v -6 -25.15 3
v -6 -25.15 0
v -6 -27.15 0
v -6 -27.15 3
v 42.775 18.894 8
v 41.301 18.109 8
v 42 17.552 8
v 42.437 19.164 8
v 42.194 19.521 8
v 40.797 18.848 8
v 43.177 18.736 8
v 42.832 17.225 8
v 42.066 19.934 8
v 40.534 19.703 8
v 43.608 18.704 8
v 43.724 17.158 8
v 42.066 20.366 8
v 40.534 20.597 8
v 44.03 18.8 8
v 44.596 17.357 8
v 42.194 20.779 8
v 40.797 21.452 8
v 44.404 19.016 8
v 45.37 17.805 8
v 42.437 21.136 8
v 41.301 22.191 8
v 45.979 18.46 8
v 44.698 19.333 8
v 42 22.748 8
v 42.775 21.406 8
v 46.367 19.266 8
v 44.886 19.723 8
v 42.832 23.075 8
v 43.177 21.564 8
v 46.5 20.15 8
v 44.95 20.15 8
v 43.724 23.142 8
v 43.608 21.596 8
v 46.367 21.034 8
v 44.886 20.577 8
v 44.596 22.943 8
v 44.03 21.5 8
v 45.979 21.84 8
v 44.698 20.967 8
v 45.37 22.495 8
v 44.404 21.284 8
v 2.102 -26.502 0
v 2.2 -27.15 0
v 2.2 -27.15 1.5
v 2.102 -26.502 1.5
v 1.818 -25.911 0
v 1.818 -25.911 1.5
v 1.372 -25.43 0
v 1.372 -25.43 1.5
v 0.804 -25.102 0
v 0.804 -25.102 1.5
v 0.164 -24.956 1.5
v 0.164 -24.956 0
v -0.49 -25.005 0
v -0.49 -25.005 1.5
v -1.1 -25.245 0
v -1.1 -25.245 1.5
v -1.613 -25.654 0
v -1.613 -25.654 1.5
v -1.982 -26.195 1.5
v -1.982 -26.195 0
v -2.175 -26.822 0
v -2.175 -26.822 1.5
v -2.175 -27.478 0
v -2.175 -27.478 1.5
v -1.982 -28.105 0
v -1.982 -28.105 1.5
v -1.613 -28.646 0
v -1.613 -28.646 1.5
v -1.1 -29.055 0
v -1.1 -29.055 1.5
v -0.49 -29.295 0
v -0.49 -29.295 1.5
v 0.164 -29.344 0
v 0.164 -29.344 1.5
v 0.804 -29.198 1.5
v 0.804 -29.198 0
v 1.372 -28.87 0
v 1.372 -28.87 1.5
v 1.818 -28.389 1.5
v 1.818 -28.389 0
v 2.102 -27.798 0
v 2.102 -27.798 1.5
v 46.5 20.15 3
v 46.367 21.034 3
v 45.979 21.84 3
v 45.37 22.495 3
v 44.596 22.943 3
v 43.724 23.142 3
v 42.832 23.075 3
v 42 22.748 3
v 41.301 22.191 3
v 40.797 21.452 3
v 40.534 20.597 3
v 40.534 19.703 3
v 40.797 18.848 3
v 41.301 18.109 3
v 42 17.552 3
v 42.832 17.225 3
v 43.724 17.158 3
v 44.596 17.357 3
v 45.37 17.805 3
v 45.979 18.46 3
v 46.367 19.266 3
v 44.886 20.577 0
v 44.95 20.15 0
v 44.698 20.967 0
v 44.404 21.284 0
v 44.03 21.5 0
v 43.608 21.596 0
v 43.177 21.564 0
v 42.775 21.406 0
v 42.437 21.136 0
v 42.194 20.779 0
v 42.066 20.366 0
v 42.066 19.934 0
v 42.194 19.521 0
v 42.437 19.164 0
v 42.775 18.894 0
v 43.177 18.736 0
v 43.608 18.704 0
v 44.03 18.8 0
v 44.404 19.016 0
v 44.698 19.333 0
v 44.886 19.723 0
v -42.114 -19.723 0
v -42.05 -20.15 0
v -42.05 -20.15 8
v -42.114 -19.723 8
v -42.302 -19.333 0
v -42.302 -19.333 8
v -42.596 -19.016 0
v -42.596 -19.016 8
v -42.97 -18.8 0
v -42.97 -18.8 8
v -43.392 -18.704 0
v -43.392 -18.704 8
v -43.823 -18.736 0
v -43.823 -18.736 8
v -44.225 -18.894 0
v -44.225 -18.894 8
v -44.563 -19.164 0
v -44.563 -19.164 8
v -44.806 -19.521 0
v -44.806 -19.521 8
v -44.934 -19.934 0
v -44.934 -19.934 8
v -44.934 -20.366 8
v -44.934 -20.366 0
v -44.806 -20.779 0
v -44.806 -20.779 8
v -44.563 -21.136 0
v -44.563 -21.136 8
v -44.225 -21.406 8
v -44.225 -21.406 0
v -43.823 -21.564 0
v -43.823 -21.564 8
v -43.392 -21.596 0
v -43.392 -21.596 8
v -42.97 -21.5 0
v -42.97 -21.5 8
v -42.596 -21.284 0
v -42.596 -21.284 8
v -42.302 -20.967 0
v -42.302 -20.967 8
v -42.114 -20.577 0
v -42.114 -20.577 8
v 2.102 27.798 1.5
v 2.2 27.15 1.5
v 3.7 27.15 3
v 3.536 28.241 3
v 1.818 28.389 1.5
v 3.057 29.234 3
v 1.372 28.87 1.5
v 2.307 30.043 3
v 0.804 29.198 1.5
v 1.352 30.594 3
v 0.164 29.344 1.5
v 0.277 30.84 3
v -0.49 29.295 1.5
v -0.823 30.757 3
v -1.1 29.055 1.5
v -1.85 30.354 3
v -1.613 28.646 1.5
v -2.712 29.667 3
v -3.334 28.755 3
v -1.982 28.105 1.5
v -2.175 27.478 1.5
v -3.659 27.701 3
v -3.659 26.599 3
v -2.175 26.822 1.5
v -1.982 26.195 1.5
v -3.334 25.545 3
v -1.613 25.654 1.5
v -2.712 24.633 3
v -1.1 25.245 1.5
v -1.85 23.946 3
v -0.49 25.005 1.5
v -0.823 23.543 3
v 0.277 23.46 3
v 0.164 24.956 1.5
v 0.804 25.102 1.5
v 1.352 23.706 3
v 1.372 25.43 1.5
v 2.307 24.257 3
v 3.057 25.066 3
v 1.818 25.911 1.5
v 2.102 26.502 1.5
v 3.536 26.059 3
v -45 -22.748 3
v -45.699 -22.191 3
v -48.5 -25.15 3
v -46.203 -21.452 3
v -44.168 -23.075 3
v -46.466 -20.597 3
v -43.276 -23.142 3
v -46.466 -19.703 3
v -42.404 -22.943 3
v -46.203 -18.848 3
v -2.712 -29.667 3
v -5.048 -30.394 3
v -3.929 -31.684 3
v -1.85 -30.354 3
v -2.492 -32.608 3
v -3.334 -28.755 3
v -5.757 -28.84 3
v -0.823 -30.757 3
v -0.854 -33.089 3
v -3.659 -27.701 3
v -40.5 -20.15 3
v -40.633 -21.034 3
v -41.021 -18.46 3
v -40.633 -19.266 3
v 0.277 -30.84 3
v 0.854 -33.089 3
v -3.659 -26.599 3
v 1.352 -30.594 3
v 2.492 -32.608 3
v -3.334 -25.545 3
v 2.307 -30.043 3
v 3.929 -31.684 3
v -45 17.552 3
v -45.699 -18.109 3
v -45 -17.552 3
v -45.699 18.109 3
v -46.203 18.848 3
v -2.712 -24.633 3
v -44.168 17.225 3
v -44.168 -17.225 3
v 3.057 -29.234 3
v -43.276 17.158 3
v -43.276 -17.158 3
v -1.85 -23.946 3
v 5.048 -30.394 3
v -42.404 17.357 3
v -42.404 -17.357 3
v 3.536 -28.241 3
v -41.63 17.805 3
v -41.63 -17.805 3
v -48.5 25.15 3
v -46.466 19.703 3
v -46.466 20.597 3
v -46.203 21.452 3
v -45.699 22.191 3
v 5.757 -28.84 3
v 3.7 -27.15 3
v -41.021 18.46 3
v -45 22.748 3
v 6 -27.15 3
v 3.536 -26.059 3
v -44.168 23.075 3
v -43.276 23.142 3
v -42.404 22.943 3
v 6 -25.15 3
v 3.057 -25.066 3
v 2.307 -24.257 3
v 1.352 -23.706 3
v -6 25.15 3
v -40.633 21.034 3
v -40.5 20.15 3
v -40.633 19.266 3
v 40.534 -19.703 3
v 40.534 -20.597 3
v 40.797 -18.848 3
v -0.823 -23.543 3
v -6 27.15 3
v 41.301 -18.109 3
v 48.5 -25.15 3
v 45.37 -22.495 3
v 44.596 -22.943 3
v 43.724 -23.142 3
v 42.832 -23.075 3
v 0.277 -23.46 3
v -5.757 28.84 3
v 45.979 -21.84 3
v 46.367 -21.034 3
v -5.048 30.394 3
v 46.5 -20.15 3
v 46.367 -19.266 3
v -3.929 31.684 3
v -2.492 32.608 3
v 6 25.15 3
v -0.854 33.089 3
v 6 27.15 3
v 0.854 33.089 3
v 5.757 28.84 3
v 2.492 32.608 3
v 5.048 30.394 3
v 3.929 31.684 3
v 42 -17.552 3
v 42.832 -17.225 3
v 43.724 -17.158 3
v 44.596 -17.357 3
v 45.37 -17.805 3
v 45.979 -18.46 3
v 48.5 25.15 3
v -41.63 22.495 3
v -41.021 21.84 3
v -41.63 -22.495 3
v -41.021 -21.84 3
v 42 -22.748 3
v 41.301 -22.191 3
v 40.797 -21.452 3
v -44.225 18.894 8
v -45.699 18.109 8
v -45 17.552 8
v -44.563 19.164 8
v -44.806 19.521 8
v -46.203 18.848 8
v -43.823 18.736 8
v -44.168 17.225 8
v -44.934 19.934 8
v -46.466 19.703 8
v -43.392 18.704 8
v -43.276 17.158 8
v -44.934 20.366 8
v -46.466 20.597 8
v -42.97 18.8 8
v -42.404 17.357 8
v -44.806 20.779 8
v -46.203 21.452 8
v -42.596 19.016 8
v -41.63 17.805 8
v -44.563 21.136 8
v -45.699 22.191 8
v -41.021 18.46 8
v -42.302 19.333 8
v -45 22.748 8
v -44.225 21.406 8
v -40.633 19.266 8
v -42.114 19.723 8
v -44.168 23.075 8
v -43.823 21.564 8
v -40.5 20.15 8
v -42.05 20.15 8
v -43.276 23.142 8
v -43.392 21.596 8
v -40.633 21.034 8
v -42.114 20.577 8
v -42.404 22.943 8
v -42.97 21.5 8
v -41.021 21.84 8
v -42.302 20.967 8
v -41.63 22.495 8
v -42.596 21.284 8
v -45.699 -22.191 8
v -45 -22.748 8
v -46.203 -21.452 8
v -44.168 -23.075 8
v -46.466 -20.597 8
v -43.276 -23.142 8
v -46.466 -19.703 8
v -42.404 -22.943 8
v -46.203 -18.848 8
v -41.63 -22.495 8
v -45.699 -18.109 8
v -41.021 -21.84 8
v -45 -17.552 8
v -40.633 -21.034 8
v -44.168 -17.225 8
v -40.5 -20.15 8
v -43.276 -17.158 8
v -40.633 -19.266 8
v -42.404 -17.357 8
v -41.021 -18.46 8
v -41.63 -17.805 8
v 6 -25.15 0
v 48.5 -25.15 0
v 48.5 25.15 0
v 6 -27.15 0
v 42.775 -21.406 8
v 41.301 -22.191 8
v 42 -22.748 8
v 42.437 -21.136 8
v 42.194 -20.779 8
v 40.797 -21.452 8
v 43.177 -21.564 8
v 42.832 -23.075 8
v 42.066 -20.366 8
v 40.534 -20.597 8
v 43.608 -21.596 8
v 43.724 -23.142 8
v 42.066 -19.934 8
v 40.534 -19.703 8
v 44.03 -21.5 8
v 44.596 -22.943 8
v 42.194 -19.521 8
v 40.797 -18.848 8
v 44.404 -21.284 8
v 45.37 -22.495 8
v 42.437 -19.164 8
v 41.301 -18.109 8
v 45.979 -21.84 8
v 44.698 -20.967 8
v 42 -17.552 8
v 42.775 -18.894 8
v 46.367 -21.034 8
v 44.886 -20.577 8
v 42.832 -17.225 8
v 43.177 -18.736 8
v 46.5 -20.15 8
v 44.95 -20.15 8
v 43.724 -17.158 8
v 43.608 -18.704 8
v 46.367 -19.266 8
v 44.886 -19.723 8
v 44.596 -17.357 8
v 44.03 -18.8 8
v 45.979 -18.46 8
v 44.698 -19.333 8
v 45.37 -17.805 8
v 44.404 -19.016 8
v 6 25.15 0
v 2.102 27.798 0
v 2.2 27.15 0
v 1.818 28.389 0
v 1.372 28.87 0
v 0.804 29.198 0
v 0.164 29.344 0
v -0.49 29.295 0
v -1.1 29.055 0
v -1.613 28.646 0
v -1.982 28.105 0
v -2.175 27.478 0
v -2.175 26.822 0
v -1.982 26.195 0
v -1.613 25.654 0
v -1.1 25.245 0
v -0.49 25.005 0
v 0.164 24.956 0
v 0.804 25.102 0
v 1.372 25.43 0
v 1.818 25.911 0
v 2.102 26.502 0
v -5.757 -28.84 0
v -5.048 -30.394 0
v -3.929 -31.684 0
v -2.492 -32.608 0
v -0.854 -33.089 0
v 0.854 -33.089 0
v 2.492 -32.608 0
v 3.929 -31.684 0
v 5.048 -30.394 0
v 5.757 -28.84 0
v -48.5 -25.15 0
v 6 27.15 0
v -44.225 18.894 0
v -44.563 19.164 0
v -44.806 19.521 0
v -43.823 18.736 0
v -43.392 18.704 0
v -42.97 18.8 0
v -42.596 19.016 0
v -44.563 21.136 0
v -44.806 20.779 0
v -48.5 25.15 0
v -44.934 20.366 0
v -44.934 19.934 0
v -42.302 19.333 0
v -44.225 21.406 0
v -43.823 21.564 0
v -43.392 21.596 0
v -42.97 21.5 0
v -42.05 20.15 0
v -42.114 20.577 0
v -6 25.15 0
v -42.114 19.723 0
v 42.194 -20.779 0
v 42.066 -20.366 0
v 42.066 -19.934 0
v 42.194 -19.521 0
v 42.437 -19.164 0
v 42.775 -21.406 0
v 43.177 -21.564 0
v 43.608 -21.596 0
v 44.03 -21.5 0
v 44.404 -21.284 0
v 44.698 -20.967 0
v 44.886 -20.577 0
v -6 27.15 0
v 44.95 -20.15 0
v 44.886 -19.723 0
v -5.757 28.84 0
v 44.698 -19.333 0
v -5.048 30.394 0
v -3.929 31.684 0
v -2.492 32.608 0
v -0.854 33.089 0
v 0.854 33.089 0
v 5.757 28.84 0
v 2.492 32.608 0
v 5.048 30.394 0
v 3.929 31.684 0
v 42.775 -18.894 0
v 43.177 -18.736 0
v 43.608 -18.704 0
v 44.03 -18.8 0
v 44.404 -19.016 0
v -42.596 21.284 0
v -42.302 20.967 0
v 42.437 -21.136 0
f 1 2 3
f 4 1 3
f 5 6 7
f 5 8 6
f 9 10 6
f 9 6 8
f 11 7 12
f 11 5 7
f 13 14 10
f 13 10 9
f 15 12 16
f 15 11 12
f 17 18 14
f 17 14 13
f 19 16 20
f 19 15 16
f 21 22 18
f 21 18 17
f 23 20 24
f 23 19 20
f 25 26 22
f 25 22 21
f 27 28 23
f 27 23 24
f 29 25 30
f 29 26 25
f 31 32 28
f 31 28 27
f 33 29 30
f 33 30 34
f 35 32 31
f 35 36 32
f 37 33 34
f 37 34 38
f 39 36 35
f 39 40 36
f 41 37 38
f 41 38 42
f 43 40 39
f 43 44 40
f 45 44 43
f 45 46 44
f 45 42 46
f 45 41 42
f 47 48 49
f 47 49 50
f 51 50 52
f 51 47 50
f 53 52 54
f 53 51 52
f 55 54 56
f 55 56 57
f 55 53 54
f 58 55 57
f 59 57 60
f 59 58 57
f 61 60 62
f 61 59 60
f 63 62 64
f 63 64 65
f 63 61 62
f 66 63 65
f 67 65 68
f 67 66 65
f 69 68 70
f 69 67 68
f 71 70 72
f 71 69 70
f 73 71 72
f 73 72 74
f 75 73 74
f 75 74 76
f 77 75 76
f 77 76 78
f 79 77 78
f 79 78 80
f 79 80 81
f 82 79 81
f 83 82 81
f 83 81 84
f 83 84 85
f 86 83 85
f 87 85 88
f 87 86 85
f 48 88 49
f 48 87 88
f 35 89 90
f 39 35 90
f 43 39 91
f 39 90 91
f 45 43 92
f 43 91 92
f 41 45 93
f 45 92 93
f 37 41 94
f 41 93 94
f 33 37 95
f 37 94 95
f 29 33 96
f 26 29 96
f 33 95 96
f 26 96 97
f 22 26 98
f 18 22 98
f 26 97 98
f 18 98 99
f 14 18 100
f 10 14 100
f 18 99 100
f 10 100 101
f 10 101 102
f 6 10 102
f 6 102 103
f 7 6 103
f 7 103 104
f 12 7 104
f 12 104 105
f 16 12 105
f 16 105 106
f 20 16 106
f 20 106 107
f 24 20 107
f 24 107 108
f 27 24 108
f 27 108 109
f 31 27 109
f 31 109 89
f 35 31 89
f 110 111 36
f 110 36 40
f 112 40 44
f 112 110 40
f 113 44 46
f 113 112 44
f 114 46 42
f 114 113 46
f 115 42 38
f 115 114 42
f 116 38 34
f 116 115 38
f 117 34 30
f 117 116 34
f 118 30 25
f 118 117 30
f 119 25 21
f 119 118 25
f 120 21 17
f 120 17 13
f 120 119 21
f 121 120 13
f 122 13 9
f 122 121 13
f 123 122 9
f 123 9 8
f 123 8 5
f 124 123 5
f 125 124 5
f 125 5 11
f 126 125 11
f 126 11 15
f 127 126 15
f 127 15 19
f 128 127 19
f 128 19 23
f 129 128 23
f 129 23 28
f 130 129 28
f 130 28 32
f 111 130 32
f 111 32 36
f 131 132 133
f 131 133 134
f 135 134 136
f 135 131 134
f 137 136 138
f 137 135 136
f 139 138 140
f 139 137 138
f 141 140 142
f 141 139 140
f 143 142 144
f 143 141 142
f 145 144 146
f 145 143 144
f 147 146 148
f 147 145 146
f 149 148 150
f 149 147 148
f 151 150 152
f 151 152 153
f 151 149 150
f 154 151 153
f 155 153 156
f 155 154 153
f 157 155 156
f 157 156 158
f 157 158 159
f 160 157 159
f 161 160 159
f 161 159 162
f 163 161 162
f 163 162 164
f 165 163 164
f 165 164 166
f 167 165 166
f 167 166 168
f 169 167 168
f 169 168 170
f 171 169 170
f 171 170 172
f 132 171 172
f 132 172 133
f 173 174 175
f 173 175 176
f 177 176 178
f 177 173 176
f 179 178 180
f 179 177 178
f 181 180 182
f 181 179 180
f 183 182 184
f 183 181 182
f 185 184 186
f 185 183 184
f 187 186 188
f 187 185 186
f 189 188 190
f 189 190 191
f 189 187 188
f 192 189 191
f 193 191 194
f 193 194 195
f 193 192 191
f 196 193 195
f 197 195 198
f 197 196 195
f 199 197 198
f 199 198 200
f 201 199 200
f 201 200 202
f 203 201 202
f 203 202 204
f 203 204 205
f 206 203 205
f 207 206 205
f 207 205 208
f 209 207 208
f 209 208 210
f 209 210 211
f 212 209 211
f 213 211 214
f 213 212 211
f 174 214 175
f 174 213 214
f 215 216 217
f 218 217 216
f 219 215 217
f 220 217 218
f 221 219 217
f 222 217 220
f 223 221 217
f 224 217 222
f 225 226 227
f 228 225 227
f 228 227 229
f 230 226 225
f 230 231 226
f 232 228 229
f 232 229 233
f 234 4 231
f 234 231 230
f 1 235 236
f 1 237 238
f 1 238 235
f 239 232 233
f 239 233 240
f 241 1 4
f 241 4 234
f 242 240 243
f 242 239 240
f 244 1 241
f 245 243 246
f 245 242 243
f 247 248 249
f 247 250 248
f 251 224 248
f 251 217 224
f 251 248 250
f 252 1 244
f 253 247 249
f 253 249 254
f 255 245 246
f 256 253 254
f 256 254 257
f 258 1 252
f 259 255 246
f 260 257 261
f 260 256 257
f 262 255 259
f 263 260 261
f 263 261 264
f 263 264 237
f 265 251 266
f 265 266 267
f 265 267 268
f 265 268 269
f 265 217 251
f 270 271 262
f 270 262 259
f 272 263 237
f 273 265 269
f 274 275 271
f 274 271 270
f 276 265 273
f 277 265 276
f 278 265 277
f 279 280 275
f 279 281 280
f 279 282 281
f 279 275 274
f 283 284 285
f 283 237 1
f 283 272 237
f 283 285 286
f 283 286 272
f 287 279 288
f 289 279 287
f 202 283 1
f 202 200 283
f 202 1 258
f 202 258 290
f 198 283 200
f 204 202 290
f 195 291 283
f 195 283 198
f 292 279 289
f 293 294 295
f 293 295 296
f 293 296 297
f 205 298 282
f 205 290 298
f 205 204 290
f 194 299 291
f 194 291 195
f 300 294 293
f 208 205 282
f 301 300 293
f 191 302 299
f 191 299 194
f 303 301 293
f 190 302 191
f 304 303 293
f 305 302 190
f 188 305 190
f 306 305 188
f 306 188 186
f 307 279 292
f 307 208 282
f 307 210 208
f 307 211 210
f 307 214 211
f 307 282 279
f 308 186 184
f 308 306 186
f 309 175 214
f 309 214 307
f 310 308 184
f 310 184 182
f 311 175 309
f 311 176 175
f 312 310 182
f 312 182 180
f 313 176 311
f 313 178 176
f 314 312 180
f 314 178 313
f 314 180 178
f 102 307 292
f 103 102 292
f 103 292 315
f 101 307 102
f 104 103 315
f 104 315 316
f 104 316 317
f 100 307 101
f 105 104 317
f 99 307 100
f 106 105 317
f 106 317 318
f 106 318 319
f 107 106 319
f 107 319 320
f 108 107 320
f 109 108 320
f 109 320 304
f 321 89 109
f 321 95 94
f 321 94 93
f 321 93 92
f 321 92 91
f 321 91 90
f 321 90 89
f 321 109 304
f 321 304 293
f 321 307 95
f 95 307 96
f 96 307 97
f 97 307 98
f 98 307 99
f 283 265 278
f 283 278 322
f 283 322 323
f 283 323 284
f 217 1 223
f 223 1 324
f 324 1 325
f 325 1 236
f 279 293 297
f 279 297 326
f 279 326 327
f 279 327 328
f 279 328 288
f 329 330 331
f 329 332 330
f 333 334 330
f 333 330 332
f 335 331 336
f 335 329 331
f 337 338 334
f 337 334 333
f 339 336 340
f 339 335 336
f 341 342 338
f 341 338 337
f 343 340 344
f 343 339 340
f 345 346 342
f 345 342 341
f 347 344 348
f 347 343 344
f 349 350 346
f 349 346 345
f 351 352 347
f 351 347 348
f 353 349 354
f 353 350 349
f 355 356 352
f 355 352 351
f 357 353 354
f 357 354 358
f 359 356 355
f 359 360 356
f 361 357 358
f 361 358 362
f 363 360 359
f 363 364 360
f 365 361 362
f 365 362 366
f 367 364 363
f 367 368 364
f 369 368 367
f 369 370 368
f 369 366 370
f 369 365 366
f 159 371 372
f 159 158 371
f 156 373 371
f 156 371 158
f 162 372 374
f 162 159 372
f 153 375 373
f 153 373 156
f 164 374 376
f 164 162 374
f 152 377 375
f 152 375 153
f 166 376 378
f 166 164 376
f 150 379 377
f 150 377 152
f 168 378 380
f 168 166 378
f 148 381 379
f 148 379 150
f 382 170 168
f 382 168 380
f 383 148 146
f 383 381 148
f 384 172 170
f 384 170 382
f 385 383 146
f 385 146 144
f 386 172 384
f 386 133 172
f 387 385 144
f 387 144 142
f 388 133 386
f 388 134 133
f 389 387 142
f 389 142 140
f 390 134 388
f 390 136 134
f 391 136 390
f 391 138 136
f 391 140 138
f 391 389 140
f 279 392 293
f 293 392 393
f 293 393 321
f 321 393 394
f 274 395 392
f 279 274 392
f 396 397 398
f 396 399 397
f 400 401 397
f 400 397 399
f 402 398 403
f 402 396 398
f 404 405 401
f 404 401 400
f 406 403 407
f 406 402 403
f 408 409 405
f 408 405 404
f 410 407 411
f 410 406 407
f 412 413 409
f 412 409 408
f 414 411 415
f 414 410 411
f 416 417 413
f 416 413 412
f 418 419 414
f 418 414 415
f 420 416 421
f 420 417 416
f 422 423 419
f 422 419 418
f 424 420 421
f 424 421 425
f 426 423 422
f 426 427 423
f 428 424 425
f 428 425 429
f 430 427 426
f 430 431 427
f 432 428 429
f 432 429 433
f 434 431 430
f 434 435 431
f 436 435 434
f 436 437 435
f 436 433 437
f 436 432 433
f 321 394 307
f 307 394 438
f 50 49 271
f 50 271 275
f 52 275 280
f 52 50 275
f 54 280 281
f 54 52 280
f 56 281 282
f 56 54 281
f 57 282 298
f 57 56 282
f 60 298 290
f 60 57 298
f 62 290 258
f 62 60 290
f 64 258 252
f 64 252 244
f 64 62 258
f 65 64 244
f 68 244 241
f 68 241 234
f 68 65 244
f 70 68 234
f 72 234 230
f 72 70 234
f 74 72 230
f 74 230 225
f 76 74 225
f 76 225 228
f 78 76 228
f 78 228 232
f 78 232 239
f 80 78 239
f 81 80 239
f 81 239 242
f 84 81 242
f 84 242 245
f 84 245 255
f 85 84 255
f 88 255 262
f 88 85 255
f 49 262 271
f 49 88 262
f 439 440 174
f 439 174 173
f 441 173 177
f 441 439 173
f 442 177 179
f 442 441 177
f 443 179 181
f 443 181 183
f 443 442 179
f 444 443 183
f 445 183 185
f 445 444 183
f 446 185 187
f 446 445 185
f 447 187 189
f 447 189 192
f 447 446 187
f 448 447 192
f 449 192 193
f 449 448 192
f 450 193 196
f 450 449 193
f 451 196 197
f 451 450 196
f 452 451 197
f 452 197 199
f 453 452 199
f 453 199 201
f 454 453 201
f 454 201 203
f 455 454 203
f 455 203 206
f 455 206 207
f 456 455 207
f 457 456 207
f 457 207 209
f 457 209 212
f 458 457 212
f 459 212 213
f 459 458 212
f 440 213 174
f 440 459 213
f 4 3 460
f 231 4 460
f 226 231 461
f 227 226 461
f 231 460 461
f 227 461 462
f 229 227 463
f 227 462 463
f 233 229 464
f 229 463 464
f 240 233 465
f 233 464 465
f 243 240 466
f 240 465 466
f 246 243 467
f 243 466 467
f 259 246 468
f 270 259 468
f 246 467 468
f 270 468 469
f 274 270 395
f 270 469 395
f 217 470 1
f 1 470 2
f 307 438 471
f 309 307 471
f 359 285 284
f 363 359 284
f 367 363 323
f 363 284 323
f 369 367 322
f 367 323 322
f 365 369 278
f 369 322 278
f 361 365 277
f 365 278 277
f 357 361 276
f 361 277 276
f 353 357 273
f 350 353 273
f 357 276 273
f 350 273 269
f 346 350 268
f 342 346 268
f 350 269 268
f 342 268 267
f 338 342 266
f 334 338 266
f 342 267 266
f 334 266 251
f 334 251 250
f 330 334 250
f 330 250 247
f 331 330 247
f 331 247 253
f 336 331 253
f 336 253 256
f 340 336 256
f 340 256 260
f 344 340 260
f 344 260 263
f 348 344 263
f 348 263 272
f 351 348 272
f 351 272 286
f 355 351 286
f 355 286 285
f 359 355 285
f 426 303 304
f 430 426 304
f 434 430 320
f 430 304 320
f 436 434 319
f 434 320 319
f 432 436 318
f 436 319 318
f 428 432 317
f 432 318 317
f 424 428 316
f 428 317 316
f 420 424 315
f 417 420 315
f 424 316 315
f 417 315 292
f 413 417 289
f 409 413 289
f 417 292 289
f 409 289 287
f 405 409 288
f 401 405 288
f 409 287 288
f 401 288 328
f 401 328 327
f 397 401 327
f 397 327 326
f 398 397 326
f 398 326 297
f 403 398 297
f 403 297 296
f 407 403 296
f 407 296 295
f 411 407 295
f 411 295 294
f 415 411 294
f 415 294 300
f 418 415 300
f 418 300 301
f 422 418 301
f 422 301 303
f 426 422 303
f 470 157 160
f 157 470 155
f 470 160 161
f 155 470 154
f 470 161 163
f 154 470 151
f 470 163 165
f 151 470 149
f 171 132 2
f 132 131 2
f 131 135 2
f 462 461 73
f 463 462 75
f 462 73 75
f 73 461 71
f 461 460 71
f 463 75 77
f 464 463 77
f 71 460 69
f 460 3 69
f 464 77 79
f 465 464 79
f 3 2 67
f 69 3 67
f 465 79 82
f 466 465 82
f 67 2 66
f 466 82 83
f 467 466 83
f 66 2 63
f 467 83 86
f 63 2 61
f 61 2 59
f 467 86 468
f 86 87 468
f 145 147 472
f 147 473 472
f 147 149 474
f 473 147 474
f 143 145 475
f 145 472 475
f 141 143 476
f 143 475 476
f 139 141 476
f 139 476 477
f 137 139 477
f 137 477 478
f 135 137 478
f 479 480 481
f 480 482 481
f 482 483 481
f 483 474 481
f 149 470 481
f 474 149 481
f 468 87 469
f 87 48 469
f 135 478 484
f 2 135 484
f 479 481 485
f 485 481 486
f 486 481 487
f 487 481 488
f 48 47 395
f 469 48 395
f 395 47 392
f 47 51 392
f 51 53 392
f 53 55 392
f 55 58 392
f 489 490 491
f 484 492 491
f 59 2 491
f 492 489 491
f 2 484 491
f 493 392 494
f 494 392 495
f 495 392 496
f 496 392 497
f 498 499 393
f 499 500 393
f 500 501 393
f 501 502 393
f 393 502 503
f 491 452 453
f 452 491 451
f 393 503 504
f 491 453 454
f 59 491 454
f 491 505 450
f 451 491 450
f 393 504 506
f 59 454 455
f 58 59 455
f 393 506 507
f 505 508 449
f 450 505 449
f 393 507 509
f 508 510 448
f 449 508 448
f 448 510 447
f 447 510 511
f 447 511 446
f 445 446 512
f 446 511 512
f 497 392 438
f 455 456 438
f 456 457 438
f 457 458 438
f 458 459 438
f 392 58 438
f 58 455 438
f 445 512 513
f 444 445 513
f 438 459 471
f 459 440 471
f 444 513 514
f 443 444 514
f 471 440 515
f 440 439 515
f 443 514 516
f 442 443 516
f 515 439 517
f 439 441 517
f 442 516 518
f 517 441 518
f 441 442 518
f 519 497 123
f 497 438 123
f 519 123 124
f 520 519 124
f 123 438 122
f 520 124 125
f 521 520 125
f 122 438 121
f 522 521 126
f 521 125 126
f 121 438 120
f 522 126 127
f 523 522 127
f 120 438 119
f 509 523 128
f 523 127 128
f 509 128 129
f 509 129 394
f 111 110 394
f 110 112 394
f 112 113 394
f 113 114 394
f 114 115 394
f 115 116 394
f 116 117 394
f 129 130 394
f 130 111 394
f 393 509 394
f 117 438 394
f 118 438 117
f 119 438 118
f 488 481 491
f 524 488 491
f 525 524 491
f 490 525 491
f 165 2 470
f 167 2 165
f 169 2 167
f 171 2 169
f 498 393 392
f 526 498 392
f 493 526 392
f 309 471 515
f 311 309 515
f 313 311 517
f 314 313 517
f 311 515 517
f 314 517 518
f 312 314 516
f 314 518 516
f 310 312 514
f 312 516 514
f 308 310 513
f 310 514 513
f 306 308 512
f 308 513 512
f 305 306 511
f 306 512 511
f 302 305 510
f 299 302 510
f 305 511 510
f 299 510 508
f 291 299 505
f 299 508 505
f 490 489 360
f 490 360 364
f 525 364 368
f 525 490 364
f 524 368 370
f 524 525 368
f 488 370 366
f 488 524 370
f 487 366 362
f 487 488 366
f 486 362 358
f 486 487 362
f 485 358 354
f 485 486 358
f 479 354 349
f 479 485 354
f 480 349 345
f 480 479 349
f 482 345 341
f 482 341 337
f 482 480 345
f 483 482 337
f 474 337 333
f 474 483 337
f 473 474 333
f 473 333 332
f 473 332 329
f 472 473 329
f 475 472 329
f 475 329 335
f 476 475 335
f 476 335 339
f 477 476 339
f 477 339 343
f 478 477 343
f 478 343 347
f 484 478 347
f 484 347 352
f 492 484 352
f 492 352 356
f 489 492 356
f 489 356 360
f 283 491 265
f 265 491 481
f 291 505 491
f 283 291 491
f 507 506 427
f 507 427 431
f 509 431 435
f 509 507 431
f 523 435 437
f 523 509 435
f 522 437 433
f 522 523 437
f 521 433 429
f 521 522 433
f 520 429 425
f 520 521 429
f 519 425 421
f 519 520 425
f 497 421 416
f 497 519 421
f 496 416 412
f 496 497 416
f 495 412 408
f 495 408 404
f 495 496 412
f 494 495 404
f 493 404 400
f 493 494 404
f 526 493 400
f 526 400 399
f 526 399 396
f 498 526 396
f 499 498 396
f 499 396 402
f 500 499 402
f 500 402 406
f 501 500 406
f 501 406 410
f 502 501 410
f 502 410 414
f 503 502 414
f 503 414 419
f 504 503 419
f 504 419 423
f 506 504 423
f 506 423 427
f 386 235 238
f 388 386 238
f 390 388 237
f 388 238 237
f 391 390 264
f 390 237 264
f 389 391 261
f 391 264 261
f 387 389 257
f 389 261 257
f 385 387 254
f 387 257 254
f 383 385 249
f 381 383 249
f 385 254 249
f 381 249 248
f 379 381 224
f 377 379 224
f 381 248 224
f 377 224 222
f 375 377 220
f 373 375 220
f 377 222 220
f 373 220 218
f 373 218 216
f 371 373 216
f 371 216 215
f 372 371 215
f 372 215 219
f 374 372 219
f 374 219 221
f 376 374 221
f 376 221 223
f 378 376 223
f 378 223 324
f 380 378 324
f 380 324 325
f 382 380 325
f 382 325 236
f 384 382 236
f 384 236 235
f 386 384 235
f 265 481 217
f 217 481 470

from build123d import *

# Parameters (mm, degrees)
F0_R     = 3
F0_R_2   = 2.2
F0_R_3   = 1.45
F1_DEPTH = 3
F2_DEPTH = 8
F3_SIZE  = 1.5


with BuildPart() as f1:
    # F0 (on Top) → F1 (new body)
    with BuildSketch(Plane.XY):
        with BuildLine():
            Line((48.5, -25.15), (48.5, 25.15))
            Line((48.5, 25.15), (6, 25.15))
            Line((6, 25.15), (6, 27.15))
            ThreePointArc((6, 27.15), (0, 33.15), (-6, 27.15))
            Line((-6, 27.15), (-6, 25.15))
            Line((-6, 25.15), (-48.5, 25.15))
            Line((-48.5, 25.15), (-48.5, -25.15))
            Line((-48.5, -25.15), (-6, -25.15))
            Line((-6, -25.15), (-6, -27.15))
            ThreePointArc((-6, -27.15), (0, -33.15), (6, -27.15))
            Line((6, -27.15), (6, -25.15))
            Line((6, -25.15), (48.5, -25.15))
        make_face()
        with Locations((-43.5, -20.15)):
            Circle(F0_R, mode=Mode.SUBTRACT)
        with Locations((0, -27.15)):
            Circle(F0_R_2, mode=Mode.SUBTRACT)
        with Locations((43.5, -20.15)):
            Circle(F0_R, mode=Mode.SUBTRACT)
        with Locations((-43.5, 20.15)):
            Circle(F0_R, mode=Mode.SUBTRACT)
        with Locations((0, 27.15)):
            Circle(F0_R_2, mode=Mode.SUBTRACT)
        with Locations((43.5, 20.15)):
            Circle(F0_R, mode=Mode.SUBTRACT)
        with Locations((-43.5, 20.15)):
            Circle(F0_R)
        with Locations((-43.5, 20.15)):
            Circle(F0_R_3, mode=Mode.SUBTRACT)
        with Locations((-43.5, -20.15)):
            Circle(F0_R)
        with Locations((-43.5, -20.15)):
            Circle(F0_R_3, mode=Mode.SUBTRACT)
        with Locations((43.5, -20.15)):
            Circle(F0_R)
        with Locations((43.5, -20.15)):
            Circle(F0_R_3, mode=Mode.SUBTRACT)
        with Locations((43.5, 20.15)):
            Circle(F0_R)
        with Locations((43.5, 20.15)):
            Circle(F0_R_3, mode=Mode.SUBTRACT)
    extrude(amount=F1_DEPTH)

    # F0 (on Top) → F2 (join)
    with BuildSketch(Plane.XY):
        with Locations((-43.5, 20.15)):
            Circle(F0_R)
        with Locations((-43.5, 20.15)):
            Circle(F0_R_3, mode=Mode.SUBTRACT)
        with Locations((-43.5, -20.15)):
            Circle(F0_R)
        with Locations((-43.5, -20.15)):
            Circle(F0_R_3, mode=Mode.SUBTRACT)
        with Locations((43.5, 20.15)):
            Circle(F0_R)
        with Locations((43.5, 20.15)):
            Circle(F0_R_3, mode=Mode.SUBTRACT)
        with Locations((43.5, -20.15)):
            Circle(F0_R)
        with Locations((43.5, -20.15)):
            Circle(F0_R_3, mode=Mode.SUBTRACT)
    extrude(amount=F2_DEPTH)

    # F3
    f3_edges = [f1.edges().sort_by_distance(p)[0] for p in [
        (-2.2, 27.15, 3),
        (-2.2, -27.15, 3),
    ]]
    chamfer(f3_edges, length=F3_SIZE)


solid = f1.part
